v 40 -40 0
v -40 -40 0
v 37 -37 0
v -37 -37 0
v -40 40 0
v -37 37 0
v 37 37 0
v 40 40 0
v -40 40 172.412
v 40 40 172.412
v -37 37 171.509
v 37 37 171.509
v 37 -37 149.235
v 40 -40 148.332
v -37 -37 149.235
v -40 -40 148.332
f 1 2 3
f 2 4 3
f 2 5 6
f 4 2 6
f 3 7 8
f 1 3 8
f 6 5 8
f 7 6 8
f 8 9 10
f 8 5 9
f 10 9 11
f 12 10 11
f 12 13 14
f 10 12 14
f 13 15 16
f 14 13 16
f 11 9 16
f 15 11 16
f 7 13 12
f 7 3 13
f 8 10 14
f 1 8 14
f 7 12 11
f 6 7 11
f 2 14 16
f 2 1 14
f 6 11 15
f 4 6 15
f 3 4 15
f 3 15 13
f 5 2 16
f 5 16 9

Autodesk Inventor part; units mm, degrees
ref_plane "YZ Plane" through (0, 0, 0) normal (1, 0, 0) x (0, 1, 0)
ref_plane "XZ Plane" through (0, 0, 0) normal (0, 1, 0) x (-1, 0, 0)
ref_plane "XY Plane" through (0, 0, 0) normal (0, 0, 1) x (1, 0, 0)
sketch "Sketch1" plane through (0, 0, 0) normal (0, 0, 1) x (1, 0, 0)
  line L0 (40, -40) -> (-40, -40)
  line L1 (-40, -40) -> (-40, 40)
  line L2 (-40, 40) -> (40, 40)
  line L3 (40, 40) -> (40, -40)
  line L4 (40, -40) -> (-40, 40) construction
  line L5 (-40, -40) -> (40, 40) construction
  line L6 (-37, -37) -> (37, -37)
  line L7 (37, -37) -> (37, 37)
  line L8 (37, 37) -> (-37, 37)
  line L9 (-37, 37) -> (-37, -37)
  point P0 (0, 0)
  dimension "d0" = 80
  dimension "d1" = 80
  dimension "d2" = 3
extrude "Extrusion1" add sketch "Sketch1" along normal blind 172.4121
sketch "Sketch2" plane through (0, 0, 0) normal (1, 0, 0) x (0, 1, 0)
  line L0 (40, 0) -> (-40, 0) projected
  line L1 (-40, 0) -> (-40, 172.4121) projected
  line L2 (40, 172.4121) -> (-40, 172.4121) projected
  line L3 (40, 0) -> (40, 172.4121) projected
  line L4 (40, 172.4121) -> (-40, 148.3319)
  point P0 (0, 0)
  dimension "d5" = 16.752
extrude "Extrusion2" cut sketch "Sketch2" along normal through all both and the other way through all contours L4 L1 L2
equation "\"d3\" = Lenth"
equation "\"d5\" = Leg_cut_angle"
equation "\"Lenth\" = Leg_hight"
equation "\"Leg_cut_angle\" = 16.751975deg"
equation "\"Leg_hight\" = 172.412142"
properties part number "ANP 1484 leg tube"
